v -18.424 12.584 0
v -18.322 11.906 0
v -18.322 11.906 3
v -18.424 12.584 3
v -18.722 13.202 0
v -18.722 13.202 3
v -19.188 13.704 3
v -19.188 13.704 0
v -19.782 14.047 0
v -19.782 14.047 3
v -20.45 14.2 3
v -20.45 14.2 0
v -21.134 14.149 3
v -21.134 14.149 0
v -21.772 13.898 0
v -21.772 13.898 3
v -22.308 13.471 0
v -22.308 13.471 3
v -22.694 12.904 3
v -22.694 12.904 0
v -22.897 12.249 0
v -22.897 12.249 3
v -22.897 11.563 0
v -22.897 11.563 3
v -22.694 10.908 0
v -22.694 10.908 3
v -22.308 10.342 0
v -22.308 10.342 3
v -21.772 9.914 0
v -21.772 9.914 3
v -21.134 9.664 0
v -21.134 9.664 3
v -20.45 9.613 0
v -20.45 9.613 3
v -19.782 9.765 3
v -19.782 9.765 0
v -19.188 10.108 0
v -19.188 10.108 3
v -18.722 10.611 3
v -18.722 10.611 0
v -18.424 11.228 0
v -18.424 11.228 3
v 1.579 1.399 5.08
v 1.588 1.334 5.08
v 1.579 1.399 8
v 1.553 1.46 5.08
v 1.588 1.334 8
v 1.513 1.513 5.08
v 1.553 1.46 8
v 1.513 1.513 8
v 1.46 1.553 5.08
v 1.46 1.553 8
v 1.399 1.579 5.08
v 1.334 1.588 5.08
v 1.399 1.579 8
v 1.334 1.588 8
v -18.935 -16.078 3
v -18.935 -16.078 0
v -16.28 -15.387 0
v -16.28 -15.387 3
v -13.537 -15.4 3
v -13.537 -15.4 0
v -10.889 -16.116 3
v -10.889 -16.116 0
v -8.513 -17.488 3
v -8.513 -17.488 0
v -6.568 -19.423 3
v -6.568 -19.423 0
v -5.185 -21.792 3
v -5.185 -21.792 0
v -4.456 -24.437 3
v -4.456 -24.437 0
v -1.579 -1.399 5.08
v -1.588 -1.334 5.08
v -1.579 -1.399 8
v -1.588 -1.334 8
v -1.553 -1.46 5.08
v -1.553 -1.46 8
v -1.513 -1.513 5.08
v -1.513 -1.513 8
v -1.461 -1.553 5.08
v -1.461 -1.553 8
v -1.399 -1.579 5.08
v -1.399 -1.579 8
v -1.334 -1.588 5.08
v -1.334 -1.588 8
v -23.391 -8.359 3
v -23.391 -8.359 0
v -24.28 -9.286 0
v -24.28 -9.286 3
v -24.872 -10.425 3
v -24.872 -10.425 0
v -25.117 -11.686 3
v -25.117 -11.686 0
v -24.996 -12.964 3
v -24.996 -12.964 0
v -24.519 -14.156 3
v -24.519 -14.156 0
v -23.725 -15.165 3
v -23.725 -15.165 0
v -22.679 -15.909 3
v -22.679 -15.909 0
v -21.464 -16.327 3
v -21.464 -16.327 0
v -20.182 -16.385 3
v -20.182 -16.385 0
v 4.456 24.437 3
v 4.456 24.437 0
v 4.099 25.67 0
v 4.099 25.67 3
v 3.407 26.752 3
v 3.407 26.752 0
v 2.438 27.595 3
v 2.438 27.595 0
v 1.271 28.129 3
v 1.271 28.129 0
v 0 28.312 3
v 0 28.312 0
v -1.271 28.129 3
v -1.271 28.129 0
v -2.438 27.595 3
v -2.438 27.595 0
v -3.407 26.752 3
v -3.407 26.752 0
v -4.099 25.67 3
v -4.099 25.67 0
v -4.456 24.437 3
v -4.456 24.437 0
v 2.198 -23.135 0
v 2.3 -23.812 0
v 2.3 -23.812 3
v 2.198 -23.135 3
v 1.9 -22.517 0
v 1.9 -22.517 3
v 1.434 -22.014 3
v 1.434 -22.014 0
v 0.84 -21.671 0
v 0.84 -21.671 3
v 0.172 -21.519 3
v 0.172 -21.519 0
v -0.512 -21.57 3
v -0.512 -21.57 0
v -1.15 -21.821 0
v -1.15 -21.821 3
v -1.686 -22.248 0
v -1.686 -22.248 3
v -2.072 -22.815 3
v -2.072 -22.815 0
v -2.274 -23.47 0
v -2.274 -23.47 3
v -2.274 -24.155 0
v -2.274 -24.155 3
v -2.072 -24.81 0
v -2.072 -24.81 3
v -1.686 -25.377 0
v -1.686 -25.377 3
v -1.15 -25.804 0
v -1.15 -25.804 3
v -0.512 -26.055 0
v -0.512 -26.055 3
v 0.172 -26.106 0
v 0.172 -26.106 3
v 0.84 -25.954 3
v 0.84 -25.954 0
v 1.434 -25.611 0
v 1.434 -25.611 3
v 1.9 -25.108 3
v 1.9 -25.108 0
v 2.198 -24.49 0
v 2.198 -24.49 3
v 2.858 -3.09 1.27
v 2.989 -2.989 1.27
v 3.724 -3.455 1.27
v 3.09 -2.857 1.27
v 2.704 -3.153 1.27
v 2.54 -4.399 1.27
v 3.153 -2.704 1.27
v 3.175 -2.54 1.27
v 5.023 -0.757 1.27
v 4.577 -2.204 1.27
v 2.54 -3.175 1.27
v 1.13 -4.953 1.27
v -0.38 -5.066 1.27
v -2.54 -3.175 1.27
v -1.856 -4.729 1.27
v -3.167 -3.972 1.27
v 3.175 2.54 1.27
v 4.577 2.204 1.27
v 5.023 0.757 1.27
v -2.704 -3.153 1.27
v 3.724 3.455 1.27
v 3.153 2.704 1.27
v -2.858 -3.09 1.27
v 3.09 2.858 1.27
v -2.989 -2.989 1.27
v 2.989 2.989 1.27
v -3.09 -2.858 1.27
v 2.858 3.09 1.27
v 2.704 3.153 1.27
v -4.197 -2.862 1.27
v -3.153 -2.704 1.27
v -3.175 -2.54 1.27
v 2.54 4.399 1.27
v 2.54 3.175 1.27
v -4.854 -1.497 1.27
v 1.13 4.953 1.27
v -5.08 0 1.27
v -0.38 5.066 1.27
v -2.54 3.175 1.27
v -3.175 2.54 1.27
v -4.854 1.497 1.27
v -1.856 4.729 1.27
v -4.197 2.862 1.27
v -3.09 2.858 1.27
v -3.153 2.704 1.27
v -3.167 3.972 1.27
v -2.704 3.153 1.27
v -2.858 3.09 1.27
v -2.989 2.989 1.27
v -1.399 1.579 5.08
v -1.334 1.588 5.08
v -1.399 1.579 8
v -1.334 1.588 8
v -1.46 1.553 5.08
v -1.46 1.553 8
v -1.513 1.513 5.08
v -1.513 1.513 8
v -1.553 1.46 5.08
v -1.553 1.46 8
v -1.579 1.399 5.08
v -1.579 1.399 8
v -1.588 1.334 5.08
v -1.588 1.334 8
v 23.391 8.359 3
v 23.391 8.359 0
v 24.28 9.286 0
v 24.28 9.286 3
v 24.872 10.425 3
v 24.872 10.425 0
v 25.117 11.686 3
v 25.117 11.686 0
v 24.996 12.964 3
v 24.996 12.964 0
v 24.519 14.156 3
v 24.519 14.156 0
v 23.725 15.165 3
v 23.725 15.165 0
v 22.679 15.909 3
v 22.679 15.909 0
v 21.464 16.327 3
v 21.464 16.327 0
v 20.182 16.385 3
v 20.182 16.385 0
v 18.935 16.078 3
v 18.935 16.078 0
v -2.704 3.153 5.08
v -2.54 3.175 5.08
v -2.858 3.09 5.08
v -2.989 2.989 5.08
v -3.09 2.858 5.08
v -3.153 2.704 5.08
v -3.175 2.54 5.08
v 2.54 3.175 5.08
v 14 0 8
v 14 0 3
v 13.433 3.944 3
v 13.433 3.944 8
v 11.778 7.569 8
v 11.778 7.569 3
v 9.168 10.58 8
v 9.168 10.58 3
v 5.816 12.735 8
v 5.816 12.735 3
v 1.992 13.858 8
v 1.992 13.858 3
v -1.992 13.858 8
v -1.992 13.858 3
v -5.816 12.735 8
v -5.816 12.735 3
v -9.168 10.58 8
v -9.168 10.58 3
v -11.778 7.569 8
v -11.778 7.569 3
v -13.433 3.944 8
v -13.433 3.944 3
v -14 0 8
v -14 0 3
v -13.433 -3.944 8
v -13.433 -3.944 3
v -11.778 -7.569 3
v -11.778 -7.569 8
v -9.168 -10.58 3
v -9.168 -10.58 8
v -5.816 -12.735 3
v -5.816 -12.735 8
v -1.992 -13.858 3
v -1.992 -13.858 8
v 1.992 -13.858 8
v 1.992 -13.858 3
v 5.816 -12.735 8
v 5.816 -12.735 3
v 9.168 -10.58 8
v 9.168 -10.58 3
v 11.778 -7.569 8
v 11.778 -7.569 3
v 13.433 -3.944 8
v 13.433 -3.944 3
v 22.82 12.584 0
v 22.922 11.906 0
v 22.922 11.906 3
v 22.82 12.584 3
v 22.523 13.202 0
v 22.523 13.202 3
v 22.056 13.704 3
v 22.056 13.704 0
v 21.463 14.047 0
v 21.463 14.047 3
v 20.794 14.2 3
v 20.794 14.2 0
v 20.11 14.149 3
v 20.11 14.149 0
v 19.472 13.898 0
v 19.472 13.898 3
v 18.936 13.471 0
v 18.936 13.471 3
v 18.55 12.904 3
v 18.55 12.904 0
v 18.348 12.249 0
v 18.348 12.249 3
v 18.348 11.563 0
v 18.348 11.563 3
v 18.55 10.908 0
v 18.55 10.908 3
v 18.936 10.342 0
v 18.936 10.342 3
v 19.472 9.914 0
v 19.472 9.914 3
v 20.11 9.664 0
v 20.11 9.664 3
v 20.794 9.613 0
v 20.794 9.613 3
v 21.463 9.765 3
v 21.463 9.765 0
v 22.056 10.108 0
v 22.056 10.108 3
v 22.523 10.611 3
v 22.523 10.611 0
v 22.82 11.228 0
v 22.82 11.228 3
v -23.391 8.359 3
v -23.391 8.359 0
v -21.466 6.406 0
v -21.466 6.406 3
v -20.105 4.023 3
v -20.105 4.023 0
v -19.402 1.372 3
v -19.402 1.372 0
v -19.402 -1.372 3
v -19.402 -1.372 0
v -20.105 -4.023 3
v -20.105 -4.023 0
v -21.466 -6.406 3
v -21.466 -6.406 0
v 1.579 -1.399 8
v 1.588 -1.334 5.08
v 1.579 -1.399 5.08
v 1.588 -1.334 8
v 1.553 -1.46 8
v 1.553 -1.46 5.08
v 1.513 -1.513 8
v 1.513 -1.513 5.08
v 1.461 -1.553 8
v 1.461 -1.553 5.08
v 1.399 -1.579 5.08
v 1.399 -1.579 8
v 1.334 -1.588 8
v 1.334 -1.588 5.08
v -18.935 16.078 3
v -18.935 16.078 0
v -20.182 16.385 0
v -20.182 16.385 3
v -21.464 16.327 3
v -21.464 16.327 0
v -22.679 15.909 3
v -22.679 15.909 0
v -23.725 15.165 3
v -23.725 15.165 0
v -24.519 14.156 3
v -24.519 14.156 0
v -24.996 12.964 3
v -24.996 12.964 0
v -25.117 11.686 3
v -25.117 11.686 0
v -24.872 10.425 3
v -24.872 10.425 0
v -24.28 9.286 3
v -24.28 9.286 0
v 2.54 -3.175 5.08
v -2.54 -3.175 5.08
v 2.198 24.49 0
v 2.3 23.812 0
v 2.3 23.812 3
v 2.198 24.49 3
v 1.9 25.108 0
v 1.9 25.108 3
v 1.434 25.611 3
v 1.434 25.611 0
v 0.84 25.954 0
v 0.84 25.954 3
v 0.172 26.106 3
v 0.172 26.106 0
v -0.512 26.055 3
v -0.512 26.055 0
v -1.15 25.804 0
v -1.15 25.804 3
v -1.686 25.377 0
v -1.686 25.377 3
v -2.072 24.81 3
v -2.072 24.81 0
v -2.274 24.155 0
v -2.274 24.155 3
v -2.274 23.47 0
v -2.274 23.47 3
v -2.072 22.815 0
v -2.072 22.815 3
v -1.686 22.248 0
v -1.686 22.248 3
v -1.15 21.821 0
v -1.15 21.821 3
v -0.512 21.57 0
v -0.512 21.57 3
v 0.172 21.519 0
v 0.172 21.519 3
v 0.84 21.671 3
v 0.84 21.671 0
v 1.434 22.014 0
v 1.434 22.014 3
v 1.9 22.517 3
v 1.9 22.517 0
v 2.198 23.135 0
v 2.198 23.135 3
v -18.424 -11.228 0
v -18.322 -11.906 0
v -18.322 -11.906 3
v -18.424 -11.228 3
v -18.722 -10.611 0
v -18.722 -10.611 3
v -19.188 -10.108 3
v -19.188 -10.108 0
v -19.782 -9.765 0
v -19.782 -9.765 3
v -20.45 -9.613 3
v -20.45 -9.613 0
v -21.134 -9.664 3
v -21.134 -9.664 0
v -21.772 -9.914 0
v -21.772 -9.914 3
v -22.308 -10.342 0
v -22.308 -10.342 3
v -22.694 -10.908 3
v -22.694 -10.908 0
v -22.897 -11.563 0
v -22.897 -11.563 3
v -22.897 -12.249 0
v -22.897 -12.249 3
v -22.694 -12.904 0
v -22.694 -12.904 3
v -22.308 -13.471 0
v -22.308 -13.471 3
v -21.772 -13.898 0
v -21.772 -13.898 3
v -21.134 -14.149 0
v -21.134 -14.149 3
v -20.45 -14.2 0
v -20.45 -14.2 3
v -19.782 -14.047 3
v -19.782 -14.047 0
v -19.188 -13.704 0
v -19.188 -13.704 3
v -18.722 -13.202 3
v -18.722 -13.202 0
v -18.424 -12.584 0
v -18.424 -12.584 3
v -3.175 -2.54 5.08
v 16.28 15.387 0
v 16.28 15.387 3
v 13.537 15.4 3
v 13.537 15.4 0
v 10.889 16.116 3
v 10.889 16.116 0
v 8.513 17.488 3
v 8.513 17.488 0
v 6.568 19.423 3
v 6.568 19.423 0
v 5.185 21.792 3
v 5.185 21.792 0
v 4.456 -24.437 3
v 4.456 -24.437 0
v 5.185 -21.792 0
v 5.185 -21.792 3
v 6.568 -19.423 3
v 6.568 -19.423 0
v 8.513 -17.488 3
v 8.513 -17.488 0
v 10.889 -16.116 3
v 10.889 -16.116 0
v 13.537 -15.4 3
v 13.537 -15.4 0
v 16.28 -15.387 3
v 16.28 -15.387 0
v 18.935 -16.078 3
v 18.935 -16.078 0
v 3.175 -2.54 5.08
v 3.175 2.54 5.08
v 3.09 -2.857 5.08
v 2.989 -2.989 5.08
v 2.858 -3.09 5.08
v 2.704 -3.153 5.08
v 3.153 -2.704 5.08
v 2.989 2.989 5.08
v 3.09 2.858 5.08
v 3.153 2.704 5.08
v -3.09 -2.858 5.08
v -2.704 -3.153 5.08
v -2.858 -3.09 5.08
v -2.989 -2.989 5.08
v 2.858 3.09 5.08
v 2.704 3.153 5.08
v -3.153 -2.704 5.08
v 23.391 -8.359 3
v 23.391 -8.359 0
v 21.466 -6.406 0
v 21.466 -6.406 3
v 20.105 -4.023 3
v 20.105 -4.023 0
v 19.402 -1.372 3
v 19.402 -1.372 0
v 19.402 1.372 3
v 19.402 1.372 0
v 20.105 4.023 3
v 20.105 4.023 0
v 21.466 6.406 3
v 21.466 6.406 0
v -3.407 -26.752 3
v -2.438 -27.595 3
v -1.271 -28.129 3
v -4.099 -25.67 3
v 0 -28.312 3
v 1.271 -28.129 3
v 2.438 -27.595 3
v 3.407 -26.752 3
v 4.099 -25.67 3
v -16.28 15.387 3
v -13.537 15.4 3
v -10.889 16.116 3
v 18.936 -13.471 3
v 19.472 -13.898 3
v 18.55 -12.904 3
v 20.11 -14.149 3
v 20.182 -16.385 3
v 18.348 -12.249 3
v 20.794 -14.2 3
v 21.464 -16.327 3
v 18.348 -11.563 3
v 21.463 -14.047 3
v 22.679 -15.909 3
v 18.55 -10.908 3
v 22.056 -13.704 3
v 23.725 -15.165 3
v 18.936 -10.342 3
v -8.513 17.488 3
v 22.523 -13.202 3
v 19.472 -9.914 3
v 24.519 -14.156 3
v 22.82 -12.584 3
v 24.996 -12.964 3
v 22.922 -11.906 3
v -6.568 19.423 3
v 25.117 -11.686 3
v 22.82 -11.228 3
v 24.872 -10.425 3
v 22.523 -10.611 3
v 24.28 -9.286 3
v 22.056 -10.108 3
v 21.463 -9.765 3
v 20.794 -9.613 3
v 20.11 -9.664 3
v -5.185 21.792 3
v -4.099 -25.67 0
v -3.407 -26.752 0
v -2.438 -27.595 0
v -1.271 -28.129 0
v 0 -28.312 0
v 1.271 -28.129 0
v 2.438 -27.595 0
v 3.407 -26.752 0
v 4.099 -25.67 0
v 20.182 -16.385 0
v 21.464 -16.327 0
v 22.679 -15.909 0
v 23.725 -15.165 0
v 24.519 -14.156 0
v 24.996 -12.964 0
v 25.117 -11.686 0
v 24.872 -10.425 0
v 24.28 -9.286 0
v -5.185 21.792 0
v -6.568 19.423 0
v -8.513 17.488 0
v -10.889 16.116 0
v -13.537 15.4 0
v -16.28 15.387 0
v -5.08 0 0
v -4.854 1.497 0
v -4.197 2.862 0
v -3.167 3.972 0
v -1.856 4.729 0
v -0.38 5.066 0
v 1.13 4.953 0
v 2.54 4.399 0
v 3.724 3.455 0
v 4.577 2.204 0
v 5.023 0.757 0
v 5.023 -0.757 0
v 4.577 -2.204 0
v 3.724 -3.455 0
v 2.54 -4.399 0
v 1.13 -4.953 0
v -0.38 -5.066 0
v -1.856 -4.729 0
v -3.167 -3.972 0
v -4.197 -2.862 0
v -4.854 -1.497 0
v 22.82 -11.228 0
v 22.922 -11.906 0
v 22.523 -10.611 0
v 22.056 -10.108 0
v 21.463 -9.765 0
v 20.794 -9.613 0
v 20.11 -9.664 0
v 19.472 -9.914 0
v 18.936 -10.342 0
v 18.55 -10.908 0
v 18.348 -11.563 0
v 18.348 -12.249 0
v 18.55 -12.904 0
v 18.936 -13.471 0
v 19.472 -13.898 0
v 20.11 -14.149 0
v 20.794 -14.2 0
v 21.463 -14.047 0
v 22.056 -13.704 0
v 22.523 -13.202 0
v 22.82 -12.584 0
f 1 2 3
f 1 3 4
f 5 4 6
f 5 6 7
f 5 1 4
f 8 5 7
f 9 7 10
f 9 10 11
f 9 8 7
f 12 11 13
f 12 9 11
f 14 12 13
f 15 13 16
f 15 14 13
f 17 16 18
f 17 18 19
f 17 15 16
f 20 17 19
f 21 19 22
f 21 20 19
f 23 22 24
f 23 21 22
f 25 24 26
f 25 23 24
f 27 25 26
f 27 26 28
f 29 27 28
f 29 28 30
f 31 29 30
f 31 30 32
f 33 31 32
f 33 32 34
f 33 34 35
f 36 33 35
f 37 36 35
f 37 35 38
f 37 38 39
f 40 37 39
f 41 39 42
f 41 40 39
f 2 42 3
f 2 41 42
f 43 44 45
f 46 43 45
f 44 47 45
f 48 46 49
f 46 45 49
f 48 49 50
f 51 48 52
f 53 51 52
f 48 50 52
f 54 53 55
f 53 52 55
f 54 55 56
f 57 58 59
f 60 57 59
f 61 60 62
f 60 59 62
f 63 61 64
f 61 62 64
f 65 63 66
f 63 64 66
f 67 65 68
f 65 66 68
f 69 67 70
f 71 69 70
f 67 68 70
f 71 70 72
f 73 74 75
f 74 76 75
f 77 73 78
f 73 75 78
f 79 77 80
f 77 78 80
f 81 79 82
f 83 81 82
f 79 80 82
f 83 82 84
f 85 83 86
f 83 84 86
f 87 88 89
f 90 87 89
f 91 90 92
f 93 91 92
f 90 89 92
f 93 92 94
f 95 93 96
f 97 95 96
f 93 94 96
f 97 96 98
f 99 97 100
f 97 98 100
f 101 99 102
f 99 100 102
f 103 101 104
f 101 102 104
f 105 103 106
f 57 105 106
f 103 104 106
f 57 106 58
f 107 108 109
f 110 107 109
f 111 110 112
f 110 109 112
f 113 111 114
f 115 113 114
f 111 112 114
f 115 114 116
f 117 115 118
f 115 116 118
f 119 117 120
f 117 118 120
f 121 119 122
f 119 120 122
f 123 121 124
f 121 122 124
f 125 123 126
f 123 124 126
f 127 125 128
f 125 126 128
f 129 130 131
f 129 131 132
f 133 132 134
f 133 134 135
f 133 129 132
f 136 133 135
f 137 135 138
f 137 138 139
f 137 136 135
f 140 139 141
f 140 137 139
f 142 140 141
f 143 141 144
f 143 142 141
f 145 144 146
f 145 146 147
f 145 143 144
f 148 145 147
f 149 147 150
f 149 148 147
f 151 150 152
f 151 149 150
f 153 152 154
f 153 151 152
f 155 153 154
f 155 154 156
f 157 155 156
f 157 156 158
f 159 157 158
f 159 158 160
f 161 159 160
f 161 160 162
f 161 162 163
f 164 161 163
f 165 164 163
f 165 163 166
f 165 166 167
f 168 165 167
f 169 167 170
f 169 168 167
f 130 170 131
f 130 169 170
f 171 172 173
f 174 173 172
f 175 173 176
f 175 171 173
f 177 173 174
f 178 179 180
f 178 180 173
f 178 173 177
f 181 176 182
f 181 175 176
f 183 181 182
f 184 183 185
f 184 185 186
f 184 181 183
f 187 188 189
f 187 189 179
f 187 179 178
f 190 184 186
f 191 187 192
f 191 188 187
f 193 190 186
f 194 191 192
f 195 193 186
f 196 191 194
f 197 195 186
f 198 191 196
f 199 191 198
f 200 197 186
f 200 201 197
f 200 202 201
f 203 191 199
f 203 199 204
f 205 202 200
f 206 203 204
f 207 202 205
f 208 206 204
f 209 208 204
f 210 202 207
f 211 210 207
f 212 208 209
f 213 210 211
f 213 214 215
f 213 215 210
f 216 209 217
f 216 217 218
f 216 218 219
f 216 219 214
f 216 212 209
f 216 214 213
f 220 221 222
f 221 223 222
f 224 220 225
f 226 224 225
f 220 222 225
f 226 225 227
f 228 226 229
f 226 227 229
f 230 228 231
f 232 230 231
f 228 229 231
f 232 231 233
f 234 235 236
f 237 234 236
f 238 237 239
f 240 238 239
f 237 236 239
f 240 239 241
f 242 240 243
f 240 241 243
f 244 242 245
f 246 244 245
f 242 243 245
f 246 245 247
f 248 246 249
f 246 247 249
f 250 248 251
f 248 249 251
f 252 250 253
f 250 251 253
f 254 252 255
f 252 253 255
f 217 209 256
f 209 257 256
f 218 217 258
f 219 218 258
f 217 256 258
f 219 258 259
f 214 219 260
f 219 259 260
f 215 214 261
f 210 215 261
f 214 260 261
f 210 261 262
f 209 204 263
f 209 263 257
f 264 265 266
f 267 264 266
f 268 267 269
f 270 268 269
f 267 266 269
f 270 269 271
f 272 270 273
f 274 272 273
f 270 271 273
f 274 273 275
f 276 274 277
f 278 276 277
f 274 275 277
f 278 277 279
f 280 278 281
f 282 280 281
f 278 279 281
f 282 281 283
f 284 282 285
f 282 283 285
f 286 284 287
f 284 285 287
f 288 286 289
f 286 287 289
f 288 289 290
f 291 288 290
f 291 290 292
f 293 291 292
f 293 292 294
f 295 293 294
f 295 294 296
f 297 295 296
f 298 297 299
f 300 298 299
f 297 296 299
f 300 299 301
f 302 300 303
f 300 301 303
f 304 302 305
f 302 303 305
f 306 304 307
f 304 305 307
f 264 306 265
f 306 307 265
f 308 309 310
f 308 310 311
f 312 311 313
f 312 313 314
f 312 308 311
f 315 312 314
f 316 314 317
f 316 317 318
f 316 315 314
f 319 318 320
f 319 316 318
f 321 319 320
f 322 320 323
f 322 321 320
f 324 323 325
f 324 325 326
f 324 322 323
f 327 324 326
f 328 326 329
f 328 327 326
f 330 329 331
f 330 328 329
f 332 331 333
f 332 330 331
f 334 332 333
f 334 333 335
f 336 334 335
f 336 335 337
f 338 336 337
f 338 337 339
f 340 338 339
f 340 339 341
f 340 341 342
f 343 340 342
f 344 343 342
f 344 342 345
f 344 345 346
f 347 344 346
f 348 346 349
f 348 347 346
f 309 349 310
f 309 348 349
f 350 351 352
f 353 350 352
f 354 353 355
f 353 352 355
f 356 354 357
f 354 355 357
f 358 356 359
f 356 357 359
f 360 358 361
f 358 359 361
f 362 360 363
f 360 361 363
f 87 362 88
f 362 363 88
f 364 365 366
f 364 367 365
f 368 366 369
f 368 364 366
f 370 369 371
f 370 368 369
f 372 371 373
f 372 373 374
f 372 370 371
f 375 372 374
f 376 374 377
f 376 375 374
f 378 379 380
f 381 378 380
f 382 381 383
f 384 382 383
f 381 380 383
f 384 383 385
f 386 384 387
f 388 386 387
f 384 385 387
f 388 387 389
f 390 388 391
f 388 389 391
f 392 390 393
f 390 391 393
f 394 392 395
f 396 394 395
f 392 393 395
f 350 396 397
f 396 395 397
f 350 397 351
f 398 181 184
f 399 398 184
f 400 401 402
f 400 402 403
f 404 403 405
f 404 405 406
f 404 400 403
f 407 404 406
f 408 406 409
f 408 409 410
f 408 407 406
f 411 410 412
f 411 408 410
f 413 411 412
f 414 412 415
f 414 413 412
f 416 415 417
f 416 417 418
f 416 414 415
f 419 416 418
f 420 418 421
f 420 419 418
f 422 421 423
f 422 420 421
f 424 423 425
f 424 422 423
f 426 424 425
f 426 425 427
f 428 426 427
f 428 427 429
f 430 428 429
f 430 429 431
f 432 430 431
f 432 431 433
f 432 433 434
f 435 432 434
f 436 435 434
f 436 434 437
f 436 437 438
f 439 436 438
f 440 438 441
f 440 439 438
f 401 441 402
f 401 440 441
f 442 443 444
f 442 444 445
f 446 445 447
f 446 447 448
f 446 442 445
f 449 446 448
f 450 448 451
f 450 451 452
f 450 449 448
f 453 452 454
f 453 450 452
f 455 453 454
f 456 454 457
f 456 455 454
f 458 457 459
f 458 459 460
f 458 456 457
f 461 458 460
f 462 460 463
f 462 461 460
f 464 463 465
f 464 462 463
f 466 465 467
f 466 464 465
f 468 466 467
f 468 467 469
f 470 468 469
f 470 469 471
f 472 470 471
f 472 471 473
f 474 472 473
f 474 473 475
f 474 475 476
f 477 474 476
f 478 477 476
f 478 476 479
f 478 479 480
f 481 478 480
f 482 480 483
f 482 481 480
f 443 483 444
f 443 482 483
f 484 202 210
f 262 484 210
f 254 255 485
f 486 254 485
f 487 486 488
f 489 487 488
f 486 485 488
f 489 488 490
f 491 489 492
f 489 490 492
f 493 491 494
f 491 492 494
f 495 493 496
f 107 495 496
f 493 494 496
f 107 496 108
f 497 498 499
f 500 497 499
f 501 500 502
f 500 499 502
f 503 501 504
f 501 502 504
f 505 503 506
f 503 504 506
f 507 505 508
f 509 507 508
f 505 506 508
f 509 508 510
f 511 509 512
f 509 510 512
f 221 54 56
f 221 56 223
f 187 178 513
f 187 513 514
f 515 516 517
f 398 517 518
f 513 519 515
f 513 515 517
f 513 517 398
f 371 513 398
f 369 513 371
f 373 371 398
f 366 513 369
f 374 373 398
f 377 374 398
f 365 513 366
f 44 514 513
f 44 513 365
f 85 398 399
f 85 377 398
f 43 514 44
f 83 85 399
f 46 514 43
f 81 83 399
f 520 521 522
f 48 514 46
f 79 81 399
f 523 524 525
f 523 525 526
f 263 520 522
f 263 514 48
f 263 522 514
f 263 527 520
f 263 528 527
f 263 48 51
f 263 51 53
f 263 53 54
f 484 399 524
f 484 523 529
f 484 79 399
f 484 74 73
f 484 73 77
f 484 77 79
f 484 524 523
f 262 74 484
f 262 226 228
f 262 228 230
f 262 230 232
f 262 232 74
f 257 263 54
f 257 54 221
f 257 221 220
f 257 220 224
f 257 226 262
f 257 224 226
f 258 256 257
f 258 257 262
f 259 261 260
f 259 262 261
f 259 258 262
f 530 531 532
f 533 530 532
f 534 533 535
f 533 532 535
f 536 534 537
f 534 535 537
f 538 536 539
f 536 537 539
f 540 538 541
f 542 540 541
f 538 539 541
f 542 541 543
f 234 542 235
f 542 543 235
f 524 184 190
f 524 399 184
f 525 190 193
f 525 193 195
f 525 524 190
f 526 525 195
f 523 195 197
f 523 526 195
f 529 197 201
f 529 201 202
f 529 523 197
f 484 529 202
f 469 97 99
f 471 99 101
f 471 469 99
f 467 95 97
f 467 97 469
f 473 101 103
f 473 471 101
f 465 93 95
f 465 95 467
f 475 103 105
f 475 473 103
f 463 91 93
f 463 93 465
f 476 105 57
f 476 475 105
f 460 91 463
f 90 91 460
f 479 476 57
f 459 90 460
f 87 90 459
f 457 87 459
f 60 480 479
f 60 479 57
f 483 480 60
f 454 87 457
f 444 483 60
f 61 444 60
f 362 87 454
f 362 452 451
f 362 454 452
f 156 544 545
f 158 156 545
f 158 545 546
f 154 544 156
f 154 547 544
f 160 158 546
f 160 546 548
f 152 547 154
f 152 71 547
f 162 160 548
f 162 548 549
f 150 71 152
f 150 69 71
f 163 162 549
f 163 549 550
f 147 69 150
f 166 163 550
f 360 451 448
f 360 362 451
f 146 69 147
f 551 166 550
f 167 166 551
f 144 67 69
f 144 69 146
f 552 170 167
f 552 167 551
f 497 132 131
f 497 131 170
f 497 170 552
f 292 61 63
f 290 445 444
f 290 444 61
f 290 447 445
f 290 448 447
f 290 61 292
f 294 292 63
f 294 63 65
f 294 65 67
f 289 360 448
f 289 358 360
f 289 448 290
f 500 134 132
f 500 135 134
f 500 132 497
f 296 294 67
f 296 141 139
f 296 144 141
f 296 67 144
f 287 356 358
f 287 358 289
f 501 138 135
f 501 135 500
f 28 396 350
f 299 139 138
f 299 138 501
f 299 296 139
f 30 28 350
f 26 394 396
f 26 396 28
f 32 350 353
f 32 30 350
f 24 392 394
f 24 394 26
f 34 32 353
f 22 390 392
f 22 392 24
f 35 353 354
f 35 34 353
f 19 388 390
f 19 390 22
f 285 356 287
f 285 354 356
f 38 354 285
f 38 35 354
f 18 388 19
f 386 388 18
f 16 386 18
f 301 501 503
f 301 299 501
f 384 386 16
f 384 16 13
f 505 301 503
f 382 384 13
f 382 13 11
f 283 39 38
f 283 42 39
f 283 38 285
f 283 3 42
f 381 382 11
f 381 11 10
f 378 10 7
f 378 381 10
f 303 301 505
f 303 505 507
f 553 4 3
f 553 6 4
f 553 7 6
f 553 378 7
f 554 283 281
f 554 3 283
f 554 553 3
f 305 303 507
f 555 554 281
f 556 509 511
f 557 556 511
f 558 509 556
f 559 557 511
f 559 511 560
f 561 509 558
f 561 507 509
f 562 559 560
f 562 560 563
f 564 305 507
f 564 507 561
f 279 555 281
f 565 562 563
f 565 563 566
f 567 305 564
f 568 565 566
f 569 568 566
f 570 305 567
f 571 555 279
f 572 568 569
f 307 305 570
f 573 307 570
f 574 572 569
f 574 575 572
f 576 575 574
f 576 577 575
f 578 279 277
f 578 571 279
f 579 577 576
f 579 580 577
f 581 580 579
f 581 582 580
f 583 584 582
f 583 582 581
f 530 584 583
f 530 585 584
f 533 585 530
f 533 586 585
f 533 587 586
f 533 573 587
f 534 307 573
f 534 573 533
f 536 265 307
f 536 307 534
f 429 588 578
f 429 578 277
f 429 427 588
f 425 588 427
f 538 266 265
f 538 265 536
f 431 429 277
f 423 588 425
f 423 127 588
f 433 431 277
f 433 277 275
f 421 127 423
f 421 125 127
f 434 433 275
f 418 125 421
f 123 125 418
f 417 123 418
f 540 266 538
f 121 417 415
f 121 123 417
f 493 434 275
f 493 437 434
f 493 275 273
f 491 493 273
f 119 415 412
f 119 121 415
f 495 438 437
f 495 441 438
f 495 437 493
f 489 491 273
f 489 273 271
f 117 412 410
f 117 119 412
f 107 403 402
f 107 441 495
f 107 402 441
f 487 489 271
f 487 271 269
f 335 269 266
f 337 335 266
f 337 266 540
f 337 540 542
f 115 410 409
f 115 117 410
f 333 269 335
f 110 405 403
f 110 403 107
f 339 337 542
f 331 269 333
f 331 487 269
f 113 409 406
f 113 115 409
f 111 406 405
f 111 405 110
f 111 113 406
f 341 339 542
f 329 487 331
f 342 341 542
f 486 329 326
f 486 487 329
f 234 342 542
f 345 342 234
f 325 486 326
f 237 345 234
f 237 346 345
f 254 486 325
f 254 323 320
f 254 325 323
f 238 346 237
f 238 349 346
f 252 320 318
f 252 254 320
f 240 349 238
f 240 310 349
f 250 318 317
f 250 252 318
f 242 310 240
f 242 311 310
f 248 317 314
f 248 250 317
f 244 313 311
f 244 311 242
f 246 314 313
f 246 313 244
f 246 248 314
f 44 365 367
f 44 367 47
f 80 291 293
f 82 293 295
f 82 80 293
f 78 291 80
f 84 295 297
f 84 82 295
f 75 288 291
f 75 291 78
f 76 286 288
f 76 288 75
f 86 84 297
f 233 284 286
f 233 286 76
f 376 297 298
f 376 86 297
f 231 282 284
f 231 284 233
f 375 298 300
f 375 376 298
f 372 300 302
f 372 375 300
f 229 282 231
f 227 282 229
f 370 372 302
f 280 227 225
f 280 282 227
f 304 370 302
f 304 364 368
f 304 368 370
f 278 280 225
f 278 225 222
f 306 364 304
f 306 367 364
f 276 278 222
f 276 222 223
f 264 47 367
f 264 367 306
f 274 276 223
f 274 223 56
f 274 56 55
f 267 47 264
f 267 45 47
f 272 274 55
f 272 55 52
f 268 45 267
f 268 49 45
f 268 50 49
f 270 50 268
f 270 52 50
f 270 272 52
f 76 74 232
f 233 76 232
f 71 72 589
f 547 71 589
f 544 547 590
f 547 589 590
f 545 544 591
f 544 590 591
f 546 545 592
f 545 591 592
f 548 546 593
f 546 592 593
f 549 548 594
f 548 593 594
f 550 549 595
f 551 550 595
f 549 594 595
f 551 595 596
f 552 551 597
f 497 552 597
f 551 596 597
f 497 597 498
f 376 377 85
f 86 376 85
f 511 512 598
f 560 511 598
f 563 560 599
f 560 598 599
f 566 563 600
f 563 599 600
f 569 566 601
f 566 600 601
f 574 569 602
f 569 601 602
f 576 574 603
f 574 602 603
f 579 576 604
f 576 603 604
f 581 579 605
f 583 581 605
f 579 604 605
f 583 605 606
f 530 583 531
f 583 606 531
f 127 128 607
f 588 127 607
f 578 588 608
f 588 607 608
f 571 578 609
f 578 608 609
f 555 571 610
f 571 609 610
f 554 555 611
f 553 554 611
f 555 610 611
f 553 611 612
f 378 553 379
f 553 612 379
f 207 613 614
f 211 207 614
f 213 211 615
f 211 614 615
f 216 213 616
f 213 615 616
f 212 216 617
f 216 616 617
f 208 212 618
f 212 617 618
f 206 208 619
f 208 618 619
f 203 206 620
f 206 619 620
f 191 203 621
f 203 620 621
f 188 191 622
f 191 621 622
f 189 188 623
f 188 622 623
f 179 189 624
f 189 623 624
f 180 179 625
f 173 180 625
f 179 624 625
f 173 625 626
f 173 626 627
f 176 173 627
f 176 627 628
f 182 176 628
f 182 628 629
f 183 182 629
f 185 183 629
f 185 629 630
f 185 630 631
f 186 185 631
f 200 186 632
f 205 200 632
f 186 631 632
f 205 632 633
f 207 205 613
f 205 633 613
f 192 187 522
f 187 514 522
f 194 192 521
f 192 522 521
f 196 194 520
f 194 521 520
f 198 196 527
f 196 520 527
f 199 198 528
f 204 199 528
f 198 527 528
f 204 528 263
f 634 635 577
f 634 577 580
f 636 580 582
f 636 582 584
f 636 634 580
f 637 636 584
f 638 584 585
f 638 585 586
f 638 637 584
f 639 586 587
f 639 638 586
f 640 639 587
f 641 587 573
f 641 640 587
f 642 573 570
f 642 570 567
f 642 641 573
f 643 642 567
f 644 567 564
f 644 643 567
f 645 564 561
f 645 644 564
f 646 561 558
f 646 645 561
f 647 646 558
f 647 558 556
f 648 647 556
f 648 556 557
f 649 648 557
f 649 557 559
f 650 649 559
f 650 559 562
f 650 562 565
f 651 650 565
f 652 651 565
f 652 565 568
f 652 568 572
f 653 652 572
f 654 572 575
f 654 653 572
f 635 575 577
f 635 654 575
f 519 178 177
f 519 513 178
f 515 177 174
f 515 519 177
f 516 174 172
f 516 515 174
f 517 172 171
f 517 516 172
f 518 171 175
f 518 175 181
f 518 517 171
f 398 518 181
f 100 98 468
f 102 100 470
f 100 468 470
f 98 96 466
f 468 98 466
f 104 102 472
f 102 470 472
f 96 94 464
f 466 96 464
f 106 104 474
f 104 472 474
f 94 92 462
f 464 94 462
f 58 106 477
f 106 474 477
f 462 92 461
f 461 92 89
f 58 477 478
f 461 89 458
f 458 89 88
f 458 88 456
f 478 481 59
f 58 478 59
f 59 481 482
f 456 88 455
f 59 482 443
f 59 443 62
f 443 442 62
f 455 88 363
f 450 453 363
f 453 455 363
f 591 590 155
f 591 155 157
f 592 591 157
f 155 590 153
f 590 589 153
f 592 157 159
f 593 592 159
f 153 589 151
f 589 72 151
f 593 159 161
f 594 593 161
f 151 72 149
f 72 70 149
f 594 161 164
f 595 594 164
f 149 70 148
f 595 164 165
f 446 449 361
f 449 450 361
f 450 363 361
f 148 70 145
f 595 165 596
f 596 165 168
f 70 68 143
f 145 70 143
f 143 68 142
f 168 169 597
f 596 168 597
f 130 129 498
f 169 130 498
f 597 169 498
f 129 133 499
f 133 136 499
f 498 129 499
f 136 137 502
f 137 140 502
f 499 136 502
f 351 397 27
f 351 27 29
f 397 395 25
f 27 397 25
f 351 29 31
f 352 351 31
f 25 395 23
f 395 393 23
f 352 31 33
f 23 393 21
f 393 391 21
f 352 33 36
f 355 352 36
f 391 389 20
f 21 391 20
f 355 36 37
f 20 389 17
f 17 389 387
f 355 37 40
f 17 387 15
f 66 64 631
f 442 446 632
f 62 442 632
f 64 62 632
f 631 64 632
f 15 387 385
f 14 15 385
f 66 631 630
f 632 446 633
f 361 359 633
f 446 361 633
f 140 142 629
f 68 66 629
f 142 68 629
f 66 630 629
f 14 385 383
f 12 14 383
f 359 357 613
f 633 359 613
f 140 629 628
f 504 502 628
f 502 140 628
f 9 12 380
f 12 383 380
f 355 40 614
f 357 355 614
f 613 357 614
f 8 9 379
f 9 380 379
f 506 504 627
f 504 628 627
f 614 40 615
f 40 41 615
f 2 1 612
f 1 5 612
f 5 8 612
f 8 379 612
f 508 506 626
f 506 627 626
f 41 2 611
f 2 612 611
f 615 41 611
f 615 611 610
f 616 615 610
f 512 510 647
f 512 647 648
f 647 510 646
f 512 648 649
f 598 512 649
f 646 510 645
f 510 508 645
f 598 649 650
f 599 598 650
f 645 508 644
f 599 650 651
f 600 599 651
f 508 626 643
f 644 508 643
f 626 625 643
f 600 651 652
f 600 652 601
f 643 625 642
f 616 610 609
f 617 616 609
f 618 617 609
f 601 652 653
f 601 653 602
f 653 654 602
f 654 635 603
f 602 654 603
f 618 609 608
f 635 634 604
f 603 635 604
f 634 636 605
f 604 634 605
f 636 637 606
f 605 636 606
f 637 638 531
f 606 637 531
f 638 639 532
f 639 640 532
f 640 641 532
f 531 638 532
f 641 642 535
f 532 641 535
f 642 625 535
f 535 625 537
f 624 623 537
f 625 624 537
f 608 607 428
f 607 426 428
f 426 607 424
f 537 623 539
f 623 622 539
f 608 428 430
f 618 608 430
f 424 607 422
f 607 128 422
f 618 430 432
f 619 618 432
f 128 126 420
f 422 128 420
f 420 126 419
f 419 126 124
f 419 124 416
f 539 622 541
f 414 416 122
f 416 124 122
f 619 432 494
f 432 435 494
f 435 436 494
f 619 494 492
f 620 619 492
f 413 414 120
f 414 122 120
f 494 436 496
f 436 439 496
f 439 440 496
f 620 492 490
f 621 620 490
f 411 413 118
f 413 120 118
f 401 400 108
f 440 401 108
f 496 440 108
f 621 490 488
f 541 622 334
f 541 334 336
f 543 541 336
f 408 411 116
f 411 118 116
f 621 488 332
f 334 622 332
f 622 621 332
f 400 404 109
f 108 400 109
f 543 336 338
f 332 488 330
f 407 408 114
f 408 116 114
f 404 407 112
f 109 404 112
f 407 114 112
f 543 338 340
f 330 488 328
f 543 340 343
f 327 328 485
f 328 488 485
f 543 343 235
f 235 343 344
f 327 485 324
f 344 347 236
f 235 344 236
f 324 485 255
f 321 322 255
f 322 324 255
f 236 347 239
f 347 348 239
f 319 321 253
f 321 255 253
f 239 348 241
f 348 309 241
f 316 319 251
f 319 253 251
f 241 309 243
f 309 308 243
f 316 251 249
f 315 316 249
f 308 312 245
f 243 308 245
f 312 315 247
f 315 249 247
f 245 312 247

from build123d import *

# Parameters (mm, degrees)
SKETCH1_R           = 2.3
BOSS_EXTRUDE1_DEPTH = 3
SKETCH2_R           = 14
BOSS_EXTRUDE2_DEPTH = 5
CUT_EXTRUDE1_REACH  = 40.688
SKETCH3_W           = 3.175
SKETCH3_H           = 3.175
SKETCH3_3_R         = 5.08
SKETCH3_3_W         = 6.35
SKETCH3_3_H         = 6.35
SKETCH3_3_W_2       = 3.175
SKETCH3_3_H_2       = 3.175
CUT_EXTRUDE2_DEPTH  = 1.27
CUT_EXTRUDE3_START  = -1.27
SKETCH3_4_W         = 6.35
SKETCH3_4_H         = 6.35
SKETCH3_4_W_2       = 3.175
SKETCH3_4_H_2       = 3.175
CUT_EXTRUDE3_DEPTH  = 3.81
FILLET1_R           = 0.254
FILLET2_R           = 0.635


with BuildPart() as part:
    # Sketch1 → Boss-Extrude1 (new body)
    with BuildSketch(Plane.XY):
        with BuildLine():
            ThreePointArc((4.456432387, 24.437168219), (-4.5e-08, 28.3125), (-4.456432399, 24.43716813))
            ThreePointArc((-4.456432399, 24.43716813), (-9.656250022, 16.725115598), (-18.934992245, 16.077967752))
            ThreePointArc((-18.934992245, 16.077967752), (-24.519343502, 14.156251286), (-23.391426978, 8.359202257))
            ThreePointArc((-23.391426978, 8.359202257), (-19.3125, 3.465e-06), (-23.391421517, -8.359197993))
            ThreePointArc((-23.391421517, -8.359197993), (-24.519344633, -14.156249327), (-18.934990017, -16.077966851))
            ThreePointArc((-18.934990017, -16.077966851), (-9.65625113, -16.725114958), (-4.456433088, -24.437163215))
            ThreePointArc((-4.456433088, -24.437163215), (-2.557e-06, -28.3125), (4.456432378, -24.437168281))
            ThreePointArc((4.456432378, -24.437168281), (9.656248045, -16.725116739), (18.934988153, -16.077966097))
            ThreePointArc((18.934988153, -16.077966097), (24.519343112, -14.156251962), (23.391424728, -8.3592005))
            ThreePointArc((23.391424728, -8.3592005), (19.3125, 1.013e-06), (23.391426325, 8.359201747))
            ThreePointArc((23.391426325, 8.359201747), (24.519343744, 14.156250867), (18.934992375, 16.077967805))
            ThreePointArc((18.934992375, 16.077967805), (9.656250044, 16.725115585), (4.456432387, 24.437168219))
        make_face()
        with Locations((0, 23.8125)):
            Circle(SKETCH1_R, mode=Mode.SUBTRACT)
        with Locations((20.622229928, 11.90625)):
            Circle(SKETCH1_R, mode=Mode.SUBTRACT)
        with Locations((-20.622229928, 11.90625)):
            Circle(SKETCH1_R, mode=Mode.SUBTRACT)
        with Locations((20.622229928, -11.90625)):
            Circle(SKETCH1_R, mode=Mode.SUBTRACT)
        with Locations((-20.622229928, -11.90625)):
            Circle(SKETCH1_R, mode=Mode.SUBTRACT)
        with Locations((0, -23.8125)):
            Circle(SKETCH1_R, mode=Mode.SUBTRACT)
    extrude(amount=BOSS_EXTRUDE1_DEPTH)

    # Sketch2 → Boss-Extrude2 (add)
    with BuildSketch(Plane.XY.offset(3)):
        Circle(SKETCH2_R)
    extrude(amount=BOSS_EXTRUDE2_DEPTH)

    # Sketch3 → Cut-Extrude1 (cut, up to next)
    with BuildSketch(Plane(origin=(0, 0, 0), x_dir=(-1, 0, 0), z_dir=(0, 0, -1)), mode=Mode.PRIVATE) as cut_extrude1_sk1:
        Rectangle(SKETCH3_W, SKETCH3_H)
    cut_extrude1_tool1 = extrude(cut_extrude1_sk1.sketch, amount=-CUT_EXTRUDE1_REACH, mode=Mode.PRIVATE) & part.part
    add(cut_extrude1_tool1.solids().sort_by_distance((0, 0, 0))[0], mode=Mode.SUBTRACT)

    # Sketch3<3> → Cut-Extrude2 (cut)
    # profile 1 of 3: a face of its own
    with BuildSketch(Plane(origin=(0, 0, 0), x_dir=(-1, 0, 0), z_dir=(0, 0, -1))):
        Circle(SKETCH3_3_R)
        Rectangle(SKETCH3_3_W, SKETCH3_3_H, mode=Mode.SUBTRACT)
    # profile 2 of 3: a face of its own
    with BuildSketch(Plane(origin=(0, 0, 0), x_dir=(-1, 0, 0), z_dir=(0, 0, -1))):
        Rectangle(SKETCH3_3_W, SKETCH3_3_H)
        Rectangle(SKETCH3_3_W_2, SKETCH3_3_H_2, mode=Mode.SUBTRACT)
    # profile 3 of 3: a face of its own
    with BuildSketch(Plane(origin=(0, 0, 0), x_dir=(-1, 0, 0), z_dir=(0, 0, -1))):
        Rectangle(SKETCH3_3_W_2, SKETCH3_3_H_2)
    extrude(amount=-CUT_EXTRUDE2_DEPTH, mode=Mode.SUBTRACT)

    # Sketch3<4> → Cut-Extrude3 (cut)
    with BuildSketch(Plane(origin=(0, 0, 0), x_dir=(-1, 0, 0), z_dir=(0, 0, -1)).offset(CUT_EXTRUDE3_START)):
        Rectangle(SKETCH3_4_W, SKETCH3_4_H)
        Rectangle(SKETCH3_4_W_2, SKETCH3_4_H_2, mode=Mode.SUBTRACT)
    extrude(amount=-CUT_EXTRUDE3_DEPTH, mode=Mode.SUBTRACT)

    # Fillet1
    fillet1_edges = [part.edges().sort_by_distance(p)[0] for p in [
        (-1.5875, -1.5875, 6.54),
        (1.5875, -1.5875, 6.54),
        (1.5875, 1.5875, 6.54),
        (-1.5875, 1.5875, 6.54),
    ]]
    fillet(fillet1_edges, radius=FILLET1_R)

    # Fillet2
    fillet2_edges = [part.edges().sort_by_distance(p)[0] for p in [
        (3.175, -3.175, 3.175),
        (3.175, 3.175, 3.175),
        (-3.175, 3.175, 3.175),
        (-3.175, -3.175, 3.175),
    ]]
    fillet(fillet2_edges, radius=FILLET2_R)


solid = part.part
